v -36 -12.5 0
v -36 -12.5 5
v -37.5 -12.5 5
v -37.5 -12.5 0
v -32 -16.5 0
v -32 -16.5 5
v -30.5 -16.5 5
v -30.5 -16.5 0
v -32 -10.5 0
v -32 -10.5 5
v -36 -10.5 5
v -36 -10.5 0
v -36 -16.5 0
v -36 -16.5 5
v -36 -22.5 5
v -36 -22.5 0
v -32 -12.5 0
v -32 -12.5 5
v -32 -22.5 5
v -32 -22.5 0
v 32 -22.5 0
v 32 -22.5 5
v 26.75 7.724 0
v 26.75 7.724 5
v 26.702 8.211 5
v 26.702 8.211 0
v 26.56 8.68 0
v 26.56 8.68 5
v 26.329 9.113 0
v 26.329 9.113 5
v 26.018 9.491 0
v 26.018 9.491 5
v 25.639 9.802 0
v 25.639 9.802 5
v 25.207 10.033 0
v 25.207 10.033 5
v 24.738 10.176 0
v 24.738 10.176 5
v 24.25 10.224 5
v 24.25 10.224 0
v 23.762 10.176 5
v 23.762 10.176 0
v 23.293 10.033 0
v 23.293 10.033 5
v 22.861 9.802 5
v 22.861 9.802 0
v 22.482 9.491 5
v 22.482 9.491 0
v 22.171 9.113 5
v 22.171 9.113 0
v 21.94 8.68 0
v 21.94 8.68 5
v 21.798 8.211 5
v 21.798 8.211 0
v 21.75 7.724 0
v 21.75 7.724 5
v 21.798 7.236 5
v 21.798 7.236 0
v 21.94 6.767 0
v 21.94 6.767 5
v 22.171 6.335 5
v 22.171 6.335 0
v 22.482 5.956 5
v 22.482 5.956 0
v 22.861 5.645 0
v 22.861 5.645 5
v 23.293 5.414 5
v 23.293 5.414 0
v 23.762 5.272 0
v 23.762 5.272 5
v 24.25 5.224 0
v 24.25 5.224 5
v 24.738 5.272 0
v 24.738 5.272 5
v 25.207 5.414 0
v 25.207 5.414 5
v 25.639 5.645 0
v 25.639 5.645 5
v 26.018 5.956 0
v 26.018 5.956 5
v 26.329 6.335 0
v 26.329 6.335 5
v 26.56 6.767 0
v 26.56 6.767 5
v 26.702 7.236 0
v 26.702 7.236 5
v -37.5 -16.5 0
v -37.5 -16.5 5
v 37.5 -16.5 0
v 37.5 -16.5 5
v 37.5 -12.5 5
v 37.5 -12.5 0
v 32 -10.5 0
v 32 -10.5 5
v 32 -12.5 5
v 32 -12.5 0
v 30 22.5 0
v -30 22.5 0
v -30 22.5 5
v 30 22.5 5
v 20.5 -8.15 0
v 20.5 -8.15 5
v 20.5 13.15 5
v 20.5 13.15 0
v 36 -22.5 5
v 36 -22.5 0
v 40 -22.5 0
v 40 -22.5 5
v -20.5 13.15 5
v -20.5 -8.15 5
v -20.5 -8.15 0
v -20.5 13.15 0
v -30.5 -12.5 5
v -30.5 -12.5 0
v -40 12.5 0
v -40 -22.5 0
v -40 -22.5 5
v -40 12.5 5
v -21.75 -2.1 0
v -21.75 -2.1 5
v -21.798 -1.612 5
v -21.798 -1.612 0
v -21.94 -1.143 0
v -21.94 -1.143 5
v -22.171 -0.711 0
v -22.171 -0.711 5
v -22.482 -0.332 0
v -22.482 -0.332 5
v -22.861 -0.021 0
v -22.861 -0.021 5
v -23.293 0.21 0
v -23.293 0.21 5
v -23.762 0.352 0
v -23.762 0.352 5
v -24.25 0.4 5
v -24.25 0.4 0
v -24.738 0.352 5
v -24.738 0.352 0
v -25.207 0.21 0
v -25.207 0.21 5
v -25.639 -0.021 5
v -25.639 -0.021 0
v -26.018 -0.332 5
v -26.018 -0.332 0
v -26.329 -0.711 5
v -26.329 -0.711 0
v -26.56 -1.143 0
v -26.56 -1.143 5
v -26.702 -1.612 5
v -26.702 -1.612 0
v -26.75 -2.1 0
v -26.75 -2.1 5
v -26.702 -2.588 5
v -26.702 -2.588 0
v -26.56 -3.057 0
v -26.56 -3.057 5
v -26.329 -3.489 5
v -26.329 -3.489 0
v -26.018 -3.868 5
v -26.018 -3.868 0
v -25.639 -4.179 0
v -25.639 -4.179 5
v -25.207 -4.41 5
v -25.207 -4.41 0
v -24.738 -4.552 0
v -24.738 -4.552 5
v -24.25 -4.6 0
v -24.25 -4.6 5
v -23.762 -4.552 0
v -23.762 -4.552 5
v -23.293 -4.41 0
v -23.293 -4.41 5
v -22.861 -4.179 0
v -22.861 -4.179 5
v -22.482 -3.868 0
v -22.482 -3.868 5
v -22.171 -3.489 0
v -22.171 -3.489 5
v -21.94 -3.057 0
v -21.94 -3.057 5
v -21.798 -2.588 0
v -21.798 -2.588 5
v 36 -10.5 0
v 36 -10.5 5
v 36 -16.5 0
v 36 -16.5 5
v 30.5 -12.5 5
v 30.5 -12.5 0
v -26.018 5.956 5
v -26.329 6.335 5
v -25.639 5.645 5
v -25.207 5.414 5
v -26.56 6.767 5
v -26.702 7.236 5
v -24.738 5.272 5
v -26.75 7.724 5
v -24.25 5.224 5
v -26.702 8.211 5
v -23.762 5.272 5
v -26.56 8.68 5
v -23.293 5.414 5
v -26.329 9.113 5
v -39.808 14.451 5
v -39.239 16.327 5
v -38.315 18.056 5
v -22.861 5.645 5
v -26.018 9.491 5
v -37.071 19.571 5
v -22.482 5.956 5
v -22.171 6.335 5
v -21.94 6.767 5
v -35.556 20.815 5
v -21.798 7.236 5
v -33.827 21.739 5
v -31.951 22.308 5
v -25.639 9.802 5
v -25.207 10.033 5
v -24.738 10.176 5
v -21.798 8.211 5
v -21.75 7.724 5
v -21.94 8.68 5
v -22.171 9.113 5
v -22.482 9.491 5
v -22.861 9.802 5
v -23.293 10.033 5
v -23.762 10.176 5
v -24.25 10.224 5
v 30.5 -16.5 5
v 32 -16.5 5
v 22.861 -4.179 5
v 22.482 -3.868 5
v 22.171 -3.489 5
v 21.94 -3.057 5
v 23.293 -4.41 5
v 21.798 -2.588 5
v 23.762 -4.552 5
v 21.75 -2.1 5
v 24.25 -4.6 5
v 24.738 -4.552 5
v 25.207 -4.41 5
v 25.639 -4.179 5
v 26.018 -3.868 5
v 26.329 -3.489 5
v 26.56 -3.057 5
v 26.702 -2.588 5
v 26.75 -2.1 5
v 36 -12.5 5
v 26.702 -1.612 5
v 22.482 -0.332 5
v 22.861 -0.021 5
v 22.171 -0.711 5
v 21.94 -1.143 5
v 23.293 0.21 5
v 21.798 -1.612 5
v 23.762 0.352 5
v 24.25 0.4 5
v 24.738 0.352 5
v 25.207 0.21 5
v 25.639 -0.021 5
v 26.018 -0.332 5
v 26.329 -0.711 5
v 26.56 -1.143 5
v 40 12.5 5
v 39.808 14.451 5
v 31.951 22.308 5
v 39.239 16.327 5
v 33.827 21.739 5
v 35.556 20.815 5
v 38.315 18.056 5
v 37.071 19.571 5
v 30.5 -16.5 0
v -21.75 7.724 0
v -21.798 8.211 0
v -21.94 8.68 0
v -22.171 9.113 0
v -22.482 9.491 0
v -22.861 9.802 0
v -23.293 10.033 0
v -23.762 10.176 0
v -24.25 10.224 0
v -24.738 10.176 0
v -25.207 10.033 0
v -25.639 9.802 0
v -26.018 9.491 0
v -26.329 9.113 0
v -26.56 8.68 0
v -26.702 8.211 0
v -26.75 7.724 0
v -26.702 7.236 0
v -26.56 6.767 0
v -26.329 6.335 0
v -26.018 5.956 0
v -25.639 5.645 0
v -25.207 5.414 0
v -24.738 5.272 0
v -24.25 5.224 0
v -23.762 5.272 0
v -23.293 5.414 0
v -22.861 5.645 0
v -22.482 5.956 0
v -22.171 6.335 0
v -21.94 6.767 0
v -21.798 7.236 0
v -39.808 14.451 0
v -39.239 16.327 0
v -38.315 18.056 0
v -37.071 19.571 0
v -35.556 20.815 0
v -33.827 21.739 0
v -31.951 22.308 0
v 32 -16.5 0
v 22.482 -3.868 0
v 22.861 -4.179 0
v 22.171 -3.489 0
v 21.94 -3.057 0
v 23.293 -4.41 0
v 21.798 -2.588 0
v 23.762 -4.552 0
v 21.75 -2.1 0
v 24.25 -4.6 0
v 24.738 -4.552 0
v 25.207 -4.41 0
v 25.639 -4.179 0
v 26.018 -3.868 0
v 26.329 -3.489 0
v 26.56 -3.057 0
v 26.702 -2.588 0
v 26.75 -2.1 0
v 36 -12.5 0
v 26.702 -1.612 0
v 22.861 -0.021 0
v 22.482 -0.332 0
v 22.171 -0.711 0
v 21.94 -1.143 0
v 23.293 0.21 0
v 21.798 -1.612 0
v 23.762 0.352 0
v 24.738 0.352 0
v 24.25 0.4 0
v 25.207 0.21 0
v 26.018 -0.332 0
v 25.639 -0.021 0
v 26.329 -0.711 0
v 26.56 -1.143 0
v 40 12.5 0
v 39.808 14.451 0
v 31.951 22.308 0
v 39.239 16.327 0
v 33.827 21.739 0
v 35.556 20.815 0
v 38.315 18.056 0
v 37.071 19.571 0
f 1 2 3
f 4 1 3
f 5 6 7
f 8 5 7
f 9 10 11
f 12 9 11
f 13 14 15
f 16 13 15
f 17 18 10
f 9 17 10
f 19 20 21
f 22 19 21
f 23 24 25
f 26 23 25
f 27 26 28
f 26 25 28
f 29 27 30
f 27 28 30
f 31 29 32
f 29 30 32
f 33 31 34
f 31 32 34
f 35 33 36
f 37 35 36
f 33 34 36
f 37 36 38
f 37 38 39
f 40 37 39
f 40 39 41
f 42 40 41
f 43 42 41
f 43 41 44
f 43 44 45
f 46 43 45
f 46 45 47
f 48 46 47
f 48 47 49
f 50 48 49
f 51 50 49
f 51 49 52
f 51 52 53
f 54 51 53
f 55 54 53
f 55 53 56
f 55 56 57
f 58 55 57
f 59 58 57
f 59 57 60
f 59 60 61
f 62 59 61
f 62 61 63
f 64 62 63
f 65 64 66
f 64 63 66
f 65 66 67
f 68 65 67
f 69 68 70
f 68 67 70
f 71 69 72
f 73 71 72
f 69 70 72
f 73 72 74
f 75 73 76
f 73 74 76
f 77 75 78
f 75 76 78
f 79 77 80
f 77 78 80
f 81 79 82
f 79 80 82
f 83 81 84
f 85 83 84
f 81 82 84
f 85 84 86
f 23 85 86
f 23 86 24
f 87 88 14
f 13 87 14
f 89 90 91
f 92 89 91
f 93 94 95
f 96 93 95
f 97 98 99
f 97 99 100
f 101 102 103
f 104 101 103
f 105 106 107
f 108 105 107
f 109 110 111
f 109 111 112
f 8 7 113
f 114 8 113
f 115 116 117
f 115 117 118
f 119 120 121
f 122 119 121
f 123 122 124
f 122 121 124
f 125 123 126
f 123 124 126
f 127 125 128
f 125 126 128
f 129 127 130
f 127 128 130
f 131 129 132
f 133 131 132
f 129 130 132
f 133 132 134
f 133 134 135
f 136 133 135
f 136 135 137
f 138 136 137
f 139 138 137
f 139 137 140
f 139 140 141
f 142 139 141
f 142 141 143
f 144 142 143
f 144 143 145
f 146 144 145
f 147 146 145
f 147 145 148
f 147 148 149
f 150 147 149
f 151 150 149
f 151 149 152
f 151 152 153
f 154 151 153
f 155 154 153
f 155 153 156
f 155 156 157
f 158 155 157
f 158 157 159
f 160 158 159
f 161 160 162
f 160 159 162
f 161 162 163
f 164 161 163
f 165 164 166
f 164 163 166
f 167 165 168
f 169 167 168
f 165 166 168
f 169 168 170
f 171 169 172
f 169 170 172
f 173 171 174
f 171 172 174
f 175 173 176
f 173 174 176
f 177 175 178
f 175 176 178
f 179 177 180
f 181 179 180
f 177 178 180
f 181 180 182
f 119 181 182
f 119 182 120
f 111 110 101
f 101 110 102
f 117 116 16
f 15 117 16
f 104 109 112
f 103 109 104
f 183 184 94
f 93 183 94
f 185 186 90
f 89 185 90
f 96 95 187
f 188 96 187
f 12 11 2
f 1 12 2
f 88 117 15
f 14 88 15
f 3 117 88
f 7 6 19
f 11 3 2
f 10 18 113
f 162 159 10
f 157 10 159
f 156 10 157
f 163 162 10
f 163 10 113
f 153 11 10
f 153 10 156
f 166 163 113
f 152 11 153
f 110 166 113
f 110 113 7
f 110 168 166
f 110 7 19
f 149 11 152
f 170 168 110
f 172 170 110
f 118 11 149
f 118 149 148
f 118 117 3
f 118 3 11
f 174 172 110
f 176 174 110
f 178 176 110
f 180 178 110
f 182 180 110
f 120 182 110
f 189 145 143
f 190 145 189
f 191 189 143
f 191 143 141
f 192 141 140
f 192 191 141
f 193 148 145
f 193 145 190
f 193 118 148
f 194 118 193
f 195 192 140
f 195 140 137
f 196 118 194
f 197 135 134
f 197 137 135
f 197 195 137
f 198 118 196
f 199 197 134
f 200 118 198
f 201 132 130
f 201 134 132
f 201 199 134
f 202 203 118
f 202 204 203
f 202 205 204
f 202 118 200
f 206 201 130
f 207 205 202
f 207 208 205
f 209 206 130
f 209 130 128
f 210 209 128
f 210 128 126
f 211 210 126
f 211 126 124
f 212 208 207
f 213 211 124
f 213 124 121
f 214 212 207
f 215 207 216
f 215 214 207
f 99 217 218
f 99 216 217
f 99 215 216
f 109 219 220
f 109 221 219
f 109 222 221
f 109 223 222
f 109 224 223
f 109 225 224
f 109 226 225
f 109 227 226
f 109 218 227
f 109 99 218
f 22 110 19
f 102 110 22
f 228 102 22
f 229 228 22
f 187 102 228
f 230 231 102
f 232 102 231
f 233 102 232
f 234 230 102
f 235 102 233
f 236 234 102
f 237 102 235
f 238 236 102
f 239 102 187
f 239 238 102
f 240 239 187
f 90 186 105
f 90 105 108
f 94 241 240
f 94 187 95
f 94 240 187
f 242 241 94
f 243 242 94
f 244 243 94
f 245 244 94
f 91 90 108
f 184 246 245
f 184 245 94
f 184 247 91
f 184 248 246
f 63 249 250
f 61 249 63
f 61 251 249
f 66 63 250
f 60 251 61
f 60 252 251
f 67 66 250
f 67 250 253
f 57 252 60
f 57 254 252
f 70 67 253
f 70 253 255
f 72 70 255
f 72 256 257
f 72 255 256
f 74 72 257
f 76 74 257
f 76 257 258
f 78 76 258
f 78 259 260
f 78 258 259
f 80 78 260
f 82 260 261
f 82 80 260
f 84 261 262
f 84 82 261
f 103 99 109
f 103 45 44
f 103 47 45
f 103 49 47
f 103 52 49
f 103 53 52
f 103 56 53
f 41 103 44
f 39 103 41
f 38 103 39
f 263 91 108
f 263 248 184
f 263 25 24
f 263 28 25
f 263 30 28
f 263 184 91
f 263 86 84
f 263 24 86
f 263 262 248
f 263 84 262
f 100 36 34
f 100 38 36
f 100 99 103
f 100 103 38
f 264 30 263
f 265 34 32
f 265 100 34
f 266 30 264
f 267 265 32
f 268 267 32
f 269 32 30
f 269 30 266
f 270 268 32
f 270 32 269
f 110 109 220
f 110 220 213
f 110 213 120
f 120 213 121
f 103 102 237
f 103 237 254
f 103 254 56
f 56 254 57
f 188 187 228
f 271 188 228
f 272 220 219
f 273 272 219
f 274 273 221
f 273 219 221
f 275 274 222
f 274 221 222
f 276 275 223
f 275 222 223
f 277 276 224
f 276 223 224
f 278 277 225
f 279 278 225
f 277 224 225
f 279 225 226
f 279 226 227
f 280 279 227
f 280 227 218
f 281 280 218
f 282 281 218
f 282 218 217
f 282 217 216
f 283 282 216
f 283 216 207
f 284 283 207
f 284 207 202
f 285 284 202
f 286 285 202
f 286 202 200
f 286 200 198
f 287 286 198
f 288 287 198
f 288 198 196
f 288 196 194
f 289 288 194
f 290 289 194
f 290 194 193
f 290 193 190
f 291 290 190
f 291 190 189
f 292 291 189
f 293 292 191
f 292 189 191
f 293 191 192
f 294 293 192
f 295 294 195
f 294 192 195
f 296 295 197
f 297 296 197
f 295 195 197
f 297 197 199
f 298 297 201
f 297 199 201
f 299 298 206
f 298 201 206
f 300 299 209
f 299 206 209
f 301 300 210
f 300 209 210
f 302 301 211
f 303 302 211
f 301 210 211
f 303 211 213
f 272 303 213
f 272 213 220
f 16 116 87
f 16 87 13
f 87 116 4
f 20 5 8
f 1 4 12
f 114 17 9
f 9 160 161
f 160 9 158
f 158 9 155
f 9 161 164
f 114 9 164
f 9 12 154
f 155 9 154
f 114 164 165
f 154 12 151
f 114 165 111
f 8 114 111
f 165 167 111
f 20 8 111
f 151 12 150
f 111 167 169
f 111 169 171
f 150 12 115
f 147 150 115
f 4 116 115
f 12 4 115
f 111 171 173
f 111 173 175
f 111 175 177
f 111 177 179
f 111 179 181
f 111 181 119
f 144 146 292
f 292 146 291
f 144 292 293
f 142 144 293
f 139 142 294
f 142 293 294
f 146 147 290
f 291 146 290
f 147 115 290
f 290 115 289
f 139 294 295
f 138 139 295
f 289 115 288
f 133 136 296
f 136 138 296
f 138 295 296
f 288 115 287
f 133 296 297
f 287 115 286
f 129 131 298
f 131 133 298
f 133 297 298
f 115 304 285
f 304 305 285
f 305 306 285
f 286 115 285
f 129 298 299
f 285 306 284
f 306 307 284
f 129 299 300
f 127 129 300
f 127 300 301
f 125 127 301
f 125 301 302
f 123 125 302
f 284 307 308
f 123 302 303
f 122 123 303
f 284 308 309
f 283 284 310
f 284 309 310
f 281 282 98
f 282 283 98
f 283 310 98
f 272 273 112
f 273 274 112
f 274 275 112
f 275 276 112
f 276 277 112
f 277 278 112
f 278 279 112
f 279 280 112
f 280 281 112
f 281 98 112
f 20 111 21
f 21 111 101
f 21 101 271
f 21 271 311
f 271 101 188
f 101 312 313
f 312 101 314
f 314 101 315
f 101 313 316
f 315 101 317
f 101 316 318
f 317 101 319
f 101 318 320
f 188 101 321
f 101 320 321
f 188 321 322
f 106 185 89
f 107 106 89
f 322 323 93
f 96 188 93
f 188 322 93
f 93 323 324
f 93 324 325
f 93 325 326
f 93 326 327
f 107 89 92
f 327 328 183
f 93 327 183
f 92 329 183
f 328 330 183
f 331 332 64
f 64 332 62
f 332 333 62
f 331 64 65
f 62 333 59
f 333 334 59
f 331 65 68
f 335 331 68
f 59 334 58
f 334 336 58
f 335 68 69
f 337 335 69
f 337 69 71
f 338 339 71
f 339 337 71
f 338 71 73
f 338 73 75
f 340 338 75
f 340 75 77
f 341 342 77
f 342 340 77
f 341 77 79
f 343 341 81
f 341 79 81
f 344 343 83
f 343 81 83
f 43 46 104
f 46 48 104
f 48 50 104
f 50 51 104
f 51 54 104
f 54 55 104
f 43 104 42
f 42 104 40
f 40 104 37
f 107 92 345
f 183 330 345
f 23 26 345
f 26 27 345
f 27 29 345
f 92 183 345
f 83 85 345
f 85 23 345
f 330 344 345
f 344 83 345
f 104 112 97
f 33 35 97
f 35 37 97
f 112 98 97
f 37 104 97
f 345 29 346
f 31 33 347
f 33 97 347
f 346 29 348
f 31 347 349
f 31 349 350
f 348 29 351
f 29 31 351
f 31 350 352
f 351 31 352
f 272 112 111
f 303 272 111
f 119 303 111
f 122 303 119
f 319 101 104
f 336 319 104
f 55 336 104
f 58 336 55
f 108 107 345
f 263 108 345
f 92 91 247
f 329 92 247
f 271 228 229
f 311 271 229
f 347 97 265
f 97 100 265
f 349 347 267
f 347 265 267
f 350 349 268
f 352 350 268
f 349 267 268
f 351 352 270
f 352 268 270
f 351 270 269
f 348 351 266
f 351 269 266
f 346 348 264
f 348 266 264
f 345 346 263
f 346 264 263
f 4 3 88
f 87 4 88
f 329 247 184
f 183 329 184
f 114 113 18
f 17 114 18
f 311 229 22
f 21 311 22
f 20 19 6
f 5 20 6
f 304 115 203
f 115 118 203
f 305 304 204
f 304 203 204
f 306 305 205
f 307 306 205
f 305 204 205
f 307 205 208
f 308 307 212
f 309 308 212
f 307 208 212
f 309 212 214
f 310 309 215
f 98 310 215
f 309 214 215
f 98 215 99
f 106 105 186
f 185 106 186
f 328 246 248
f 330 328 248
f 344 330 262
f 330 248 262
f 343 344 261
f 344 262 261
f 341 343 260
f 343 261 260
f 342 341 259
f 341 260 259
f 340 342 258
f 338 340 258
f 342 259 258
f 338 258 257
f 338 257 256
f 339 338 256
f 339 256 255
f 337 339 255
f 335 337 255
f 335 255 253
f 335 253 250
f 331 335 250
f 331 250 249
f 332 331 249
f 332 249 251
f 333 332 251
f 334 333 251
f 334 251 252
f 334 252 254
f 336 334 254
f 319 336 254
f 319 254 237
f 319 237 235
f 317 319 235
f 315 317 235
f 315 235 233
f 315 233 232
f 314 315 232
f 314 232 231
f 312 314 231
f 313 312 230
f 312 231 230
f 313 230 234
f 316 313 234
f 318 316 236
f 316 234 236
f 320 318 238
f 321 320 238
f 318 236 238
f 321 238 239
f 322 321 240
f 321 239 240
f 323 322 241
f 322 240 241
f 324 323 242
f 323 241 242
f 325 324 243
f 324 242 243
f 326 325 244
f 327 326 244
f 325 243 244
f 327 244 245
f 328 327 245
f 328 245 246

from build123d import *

# Parameters (mm, degrees)
SKETCH1_W           = 80
SKETCH1_H           = 45
BOSS_EXTRUDE1_DEPTH = 5
SKETCH2_R           = 2.5
SKETCH2_W           = 41
SKETCH2_H           = 21.3
CUT_EXTRUDE1_DEPTH  = 10
CUT_EXTRUDE2_DEPTH  = 10
FILLET1_R           = 10


with BuildPart() as part:
    # Sketch1 → Boss-Extrude1 (new body)
    with BuildSketch(Plane.XY):
        Rectangle(SKETCH1_W, SKETCH1_H)
    extrude(amount=BOSS_EXTRUDE1_DEPTH)

    # Sketch2 → Cut-Extrude1 (cut)
    with BuildSketch(Plane.XY.offset(5)):
        with Locations((-24.25, -2.1)):
            Circle(SKETCH2_R)
        with Locations((-24.25, 7.72372371)):
            Circle(SKETCH2_R)
        with Locations((24.25, 7.72372371)):
            Circle(SKETCH2_R)
        with Locations((24.25, -2.1)):
            Circle(SKETCH2_R)
        with Locations((0, 2.5)):
            Rectangle(SKETCH2_W, SKETCH2_H)
    extrude(amount=-CUT_EXTRUDE1_DEPTH, mode=Mode.SUBTRACT)

    # Sketch3 → Cut-Extrude2 (cut)
    with BuildSketch(Plane.XY.offset(5)):
        Polygon((-36, -16.5), (-36, -22.5), (-34, -22.5), (-34, -10.5), (-36, -10.5), (-36, -12.5), (-37.5, -12.5), (-37.5, -16.5), align=None)
        Polygon((-34, -10.5), (-34, -22.5), (-32, -22.5), (-32, -16.5), (-30.5, -16.5), (-30.5, -12.5), (-32, -12.5), (-32, -10.5), align=None)
        Polygon((32, -16.5), (32, -22.5), (34, -22.5), (34, -10.5), (32, -10.5), (32, -12.5), (30.5, -12.5), (30.5, -16.5), align=None)
        Polygon((34, -10.5), (34, -22.5), (36, -22.5), (36, -16.5), (37.5, -16.5), (37.5, -12.5), (36, -12.5), (36, -10.5), align=None)
    extrude(amount=-CUT_EXTRUDE2_DEPTH, mode=Mode.SUBTRACT)

    # Fillet1
    fillet1_edges = [part.edges().sort_by_distance(p)[0] for p in [
        (-40, 22.5, 2.5),
        (40, 22.5, 2.5),
    ]]
    fillet(fillet1_edges, radius=FILLET1_R)


solid = part.part
